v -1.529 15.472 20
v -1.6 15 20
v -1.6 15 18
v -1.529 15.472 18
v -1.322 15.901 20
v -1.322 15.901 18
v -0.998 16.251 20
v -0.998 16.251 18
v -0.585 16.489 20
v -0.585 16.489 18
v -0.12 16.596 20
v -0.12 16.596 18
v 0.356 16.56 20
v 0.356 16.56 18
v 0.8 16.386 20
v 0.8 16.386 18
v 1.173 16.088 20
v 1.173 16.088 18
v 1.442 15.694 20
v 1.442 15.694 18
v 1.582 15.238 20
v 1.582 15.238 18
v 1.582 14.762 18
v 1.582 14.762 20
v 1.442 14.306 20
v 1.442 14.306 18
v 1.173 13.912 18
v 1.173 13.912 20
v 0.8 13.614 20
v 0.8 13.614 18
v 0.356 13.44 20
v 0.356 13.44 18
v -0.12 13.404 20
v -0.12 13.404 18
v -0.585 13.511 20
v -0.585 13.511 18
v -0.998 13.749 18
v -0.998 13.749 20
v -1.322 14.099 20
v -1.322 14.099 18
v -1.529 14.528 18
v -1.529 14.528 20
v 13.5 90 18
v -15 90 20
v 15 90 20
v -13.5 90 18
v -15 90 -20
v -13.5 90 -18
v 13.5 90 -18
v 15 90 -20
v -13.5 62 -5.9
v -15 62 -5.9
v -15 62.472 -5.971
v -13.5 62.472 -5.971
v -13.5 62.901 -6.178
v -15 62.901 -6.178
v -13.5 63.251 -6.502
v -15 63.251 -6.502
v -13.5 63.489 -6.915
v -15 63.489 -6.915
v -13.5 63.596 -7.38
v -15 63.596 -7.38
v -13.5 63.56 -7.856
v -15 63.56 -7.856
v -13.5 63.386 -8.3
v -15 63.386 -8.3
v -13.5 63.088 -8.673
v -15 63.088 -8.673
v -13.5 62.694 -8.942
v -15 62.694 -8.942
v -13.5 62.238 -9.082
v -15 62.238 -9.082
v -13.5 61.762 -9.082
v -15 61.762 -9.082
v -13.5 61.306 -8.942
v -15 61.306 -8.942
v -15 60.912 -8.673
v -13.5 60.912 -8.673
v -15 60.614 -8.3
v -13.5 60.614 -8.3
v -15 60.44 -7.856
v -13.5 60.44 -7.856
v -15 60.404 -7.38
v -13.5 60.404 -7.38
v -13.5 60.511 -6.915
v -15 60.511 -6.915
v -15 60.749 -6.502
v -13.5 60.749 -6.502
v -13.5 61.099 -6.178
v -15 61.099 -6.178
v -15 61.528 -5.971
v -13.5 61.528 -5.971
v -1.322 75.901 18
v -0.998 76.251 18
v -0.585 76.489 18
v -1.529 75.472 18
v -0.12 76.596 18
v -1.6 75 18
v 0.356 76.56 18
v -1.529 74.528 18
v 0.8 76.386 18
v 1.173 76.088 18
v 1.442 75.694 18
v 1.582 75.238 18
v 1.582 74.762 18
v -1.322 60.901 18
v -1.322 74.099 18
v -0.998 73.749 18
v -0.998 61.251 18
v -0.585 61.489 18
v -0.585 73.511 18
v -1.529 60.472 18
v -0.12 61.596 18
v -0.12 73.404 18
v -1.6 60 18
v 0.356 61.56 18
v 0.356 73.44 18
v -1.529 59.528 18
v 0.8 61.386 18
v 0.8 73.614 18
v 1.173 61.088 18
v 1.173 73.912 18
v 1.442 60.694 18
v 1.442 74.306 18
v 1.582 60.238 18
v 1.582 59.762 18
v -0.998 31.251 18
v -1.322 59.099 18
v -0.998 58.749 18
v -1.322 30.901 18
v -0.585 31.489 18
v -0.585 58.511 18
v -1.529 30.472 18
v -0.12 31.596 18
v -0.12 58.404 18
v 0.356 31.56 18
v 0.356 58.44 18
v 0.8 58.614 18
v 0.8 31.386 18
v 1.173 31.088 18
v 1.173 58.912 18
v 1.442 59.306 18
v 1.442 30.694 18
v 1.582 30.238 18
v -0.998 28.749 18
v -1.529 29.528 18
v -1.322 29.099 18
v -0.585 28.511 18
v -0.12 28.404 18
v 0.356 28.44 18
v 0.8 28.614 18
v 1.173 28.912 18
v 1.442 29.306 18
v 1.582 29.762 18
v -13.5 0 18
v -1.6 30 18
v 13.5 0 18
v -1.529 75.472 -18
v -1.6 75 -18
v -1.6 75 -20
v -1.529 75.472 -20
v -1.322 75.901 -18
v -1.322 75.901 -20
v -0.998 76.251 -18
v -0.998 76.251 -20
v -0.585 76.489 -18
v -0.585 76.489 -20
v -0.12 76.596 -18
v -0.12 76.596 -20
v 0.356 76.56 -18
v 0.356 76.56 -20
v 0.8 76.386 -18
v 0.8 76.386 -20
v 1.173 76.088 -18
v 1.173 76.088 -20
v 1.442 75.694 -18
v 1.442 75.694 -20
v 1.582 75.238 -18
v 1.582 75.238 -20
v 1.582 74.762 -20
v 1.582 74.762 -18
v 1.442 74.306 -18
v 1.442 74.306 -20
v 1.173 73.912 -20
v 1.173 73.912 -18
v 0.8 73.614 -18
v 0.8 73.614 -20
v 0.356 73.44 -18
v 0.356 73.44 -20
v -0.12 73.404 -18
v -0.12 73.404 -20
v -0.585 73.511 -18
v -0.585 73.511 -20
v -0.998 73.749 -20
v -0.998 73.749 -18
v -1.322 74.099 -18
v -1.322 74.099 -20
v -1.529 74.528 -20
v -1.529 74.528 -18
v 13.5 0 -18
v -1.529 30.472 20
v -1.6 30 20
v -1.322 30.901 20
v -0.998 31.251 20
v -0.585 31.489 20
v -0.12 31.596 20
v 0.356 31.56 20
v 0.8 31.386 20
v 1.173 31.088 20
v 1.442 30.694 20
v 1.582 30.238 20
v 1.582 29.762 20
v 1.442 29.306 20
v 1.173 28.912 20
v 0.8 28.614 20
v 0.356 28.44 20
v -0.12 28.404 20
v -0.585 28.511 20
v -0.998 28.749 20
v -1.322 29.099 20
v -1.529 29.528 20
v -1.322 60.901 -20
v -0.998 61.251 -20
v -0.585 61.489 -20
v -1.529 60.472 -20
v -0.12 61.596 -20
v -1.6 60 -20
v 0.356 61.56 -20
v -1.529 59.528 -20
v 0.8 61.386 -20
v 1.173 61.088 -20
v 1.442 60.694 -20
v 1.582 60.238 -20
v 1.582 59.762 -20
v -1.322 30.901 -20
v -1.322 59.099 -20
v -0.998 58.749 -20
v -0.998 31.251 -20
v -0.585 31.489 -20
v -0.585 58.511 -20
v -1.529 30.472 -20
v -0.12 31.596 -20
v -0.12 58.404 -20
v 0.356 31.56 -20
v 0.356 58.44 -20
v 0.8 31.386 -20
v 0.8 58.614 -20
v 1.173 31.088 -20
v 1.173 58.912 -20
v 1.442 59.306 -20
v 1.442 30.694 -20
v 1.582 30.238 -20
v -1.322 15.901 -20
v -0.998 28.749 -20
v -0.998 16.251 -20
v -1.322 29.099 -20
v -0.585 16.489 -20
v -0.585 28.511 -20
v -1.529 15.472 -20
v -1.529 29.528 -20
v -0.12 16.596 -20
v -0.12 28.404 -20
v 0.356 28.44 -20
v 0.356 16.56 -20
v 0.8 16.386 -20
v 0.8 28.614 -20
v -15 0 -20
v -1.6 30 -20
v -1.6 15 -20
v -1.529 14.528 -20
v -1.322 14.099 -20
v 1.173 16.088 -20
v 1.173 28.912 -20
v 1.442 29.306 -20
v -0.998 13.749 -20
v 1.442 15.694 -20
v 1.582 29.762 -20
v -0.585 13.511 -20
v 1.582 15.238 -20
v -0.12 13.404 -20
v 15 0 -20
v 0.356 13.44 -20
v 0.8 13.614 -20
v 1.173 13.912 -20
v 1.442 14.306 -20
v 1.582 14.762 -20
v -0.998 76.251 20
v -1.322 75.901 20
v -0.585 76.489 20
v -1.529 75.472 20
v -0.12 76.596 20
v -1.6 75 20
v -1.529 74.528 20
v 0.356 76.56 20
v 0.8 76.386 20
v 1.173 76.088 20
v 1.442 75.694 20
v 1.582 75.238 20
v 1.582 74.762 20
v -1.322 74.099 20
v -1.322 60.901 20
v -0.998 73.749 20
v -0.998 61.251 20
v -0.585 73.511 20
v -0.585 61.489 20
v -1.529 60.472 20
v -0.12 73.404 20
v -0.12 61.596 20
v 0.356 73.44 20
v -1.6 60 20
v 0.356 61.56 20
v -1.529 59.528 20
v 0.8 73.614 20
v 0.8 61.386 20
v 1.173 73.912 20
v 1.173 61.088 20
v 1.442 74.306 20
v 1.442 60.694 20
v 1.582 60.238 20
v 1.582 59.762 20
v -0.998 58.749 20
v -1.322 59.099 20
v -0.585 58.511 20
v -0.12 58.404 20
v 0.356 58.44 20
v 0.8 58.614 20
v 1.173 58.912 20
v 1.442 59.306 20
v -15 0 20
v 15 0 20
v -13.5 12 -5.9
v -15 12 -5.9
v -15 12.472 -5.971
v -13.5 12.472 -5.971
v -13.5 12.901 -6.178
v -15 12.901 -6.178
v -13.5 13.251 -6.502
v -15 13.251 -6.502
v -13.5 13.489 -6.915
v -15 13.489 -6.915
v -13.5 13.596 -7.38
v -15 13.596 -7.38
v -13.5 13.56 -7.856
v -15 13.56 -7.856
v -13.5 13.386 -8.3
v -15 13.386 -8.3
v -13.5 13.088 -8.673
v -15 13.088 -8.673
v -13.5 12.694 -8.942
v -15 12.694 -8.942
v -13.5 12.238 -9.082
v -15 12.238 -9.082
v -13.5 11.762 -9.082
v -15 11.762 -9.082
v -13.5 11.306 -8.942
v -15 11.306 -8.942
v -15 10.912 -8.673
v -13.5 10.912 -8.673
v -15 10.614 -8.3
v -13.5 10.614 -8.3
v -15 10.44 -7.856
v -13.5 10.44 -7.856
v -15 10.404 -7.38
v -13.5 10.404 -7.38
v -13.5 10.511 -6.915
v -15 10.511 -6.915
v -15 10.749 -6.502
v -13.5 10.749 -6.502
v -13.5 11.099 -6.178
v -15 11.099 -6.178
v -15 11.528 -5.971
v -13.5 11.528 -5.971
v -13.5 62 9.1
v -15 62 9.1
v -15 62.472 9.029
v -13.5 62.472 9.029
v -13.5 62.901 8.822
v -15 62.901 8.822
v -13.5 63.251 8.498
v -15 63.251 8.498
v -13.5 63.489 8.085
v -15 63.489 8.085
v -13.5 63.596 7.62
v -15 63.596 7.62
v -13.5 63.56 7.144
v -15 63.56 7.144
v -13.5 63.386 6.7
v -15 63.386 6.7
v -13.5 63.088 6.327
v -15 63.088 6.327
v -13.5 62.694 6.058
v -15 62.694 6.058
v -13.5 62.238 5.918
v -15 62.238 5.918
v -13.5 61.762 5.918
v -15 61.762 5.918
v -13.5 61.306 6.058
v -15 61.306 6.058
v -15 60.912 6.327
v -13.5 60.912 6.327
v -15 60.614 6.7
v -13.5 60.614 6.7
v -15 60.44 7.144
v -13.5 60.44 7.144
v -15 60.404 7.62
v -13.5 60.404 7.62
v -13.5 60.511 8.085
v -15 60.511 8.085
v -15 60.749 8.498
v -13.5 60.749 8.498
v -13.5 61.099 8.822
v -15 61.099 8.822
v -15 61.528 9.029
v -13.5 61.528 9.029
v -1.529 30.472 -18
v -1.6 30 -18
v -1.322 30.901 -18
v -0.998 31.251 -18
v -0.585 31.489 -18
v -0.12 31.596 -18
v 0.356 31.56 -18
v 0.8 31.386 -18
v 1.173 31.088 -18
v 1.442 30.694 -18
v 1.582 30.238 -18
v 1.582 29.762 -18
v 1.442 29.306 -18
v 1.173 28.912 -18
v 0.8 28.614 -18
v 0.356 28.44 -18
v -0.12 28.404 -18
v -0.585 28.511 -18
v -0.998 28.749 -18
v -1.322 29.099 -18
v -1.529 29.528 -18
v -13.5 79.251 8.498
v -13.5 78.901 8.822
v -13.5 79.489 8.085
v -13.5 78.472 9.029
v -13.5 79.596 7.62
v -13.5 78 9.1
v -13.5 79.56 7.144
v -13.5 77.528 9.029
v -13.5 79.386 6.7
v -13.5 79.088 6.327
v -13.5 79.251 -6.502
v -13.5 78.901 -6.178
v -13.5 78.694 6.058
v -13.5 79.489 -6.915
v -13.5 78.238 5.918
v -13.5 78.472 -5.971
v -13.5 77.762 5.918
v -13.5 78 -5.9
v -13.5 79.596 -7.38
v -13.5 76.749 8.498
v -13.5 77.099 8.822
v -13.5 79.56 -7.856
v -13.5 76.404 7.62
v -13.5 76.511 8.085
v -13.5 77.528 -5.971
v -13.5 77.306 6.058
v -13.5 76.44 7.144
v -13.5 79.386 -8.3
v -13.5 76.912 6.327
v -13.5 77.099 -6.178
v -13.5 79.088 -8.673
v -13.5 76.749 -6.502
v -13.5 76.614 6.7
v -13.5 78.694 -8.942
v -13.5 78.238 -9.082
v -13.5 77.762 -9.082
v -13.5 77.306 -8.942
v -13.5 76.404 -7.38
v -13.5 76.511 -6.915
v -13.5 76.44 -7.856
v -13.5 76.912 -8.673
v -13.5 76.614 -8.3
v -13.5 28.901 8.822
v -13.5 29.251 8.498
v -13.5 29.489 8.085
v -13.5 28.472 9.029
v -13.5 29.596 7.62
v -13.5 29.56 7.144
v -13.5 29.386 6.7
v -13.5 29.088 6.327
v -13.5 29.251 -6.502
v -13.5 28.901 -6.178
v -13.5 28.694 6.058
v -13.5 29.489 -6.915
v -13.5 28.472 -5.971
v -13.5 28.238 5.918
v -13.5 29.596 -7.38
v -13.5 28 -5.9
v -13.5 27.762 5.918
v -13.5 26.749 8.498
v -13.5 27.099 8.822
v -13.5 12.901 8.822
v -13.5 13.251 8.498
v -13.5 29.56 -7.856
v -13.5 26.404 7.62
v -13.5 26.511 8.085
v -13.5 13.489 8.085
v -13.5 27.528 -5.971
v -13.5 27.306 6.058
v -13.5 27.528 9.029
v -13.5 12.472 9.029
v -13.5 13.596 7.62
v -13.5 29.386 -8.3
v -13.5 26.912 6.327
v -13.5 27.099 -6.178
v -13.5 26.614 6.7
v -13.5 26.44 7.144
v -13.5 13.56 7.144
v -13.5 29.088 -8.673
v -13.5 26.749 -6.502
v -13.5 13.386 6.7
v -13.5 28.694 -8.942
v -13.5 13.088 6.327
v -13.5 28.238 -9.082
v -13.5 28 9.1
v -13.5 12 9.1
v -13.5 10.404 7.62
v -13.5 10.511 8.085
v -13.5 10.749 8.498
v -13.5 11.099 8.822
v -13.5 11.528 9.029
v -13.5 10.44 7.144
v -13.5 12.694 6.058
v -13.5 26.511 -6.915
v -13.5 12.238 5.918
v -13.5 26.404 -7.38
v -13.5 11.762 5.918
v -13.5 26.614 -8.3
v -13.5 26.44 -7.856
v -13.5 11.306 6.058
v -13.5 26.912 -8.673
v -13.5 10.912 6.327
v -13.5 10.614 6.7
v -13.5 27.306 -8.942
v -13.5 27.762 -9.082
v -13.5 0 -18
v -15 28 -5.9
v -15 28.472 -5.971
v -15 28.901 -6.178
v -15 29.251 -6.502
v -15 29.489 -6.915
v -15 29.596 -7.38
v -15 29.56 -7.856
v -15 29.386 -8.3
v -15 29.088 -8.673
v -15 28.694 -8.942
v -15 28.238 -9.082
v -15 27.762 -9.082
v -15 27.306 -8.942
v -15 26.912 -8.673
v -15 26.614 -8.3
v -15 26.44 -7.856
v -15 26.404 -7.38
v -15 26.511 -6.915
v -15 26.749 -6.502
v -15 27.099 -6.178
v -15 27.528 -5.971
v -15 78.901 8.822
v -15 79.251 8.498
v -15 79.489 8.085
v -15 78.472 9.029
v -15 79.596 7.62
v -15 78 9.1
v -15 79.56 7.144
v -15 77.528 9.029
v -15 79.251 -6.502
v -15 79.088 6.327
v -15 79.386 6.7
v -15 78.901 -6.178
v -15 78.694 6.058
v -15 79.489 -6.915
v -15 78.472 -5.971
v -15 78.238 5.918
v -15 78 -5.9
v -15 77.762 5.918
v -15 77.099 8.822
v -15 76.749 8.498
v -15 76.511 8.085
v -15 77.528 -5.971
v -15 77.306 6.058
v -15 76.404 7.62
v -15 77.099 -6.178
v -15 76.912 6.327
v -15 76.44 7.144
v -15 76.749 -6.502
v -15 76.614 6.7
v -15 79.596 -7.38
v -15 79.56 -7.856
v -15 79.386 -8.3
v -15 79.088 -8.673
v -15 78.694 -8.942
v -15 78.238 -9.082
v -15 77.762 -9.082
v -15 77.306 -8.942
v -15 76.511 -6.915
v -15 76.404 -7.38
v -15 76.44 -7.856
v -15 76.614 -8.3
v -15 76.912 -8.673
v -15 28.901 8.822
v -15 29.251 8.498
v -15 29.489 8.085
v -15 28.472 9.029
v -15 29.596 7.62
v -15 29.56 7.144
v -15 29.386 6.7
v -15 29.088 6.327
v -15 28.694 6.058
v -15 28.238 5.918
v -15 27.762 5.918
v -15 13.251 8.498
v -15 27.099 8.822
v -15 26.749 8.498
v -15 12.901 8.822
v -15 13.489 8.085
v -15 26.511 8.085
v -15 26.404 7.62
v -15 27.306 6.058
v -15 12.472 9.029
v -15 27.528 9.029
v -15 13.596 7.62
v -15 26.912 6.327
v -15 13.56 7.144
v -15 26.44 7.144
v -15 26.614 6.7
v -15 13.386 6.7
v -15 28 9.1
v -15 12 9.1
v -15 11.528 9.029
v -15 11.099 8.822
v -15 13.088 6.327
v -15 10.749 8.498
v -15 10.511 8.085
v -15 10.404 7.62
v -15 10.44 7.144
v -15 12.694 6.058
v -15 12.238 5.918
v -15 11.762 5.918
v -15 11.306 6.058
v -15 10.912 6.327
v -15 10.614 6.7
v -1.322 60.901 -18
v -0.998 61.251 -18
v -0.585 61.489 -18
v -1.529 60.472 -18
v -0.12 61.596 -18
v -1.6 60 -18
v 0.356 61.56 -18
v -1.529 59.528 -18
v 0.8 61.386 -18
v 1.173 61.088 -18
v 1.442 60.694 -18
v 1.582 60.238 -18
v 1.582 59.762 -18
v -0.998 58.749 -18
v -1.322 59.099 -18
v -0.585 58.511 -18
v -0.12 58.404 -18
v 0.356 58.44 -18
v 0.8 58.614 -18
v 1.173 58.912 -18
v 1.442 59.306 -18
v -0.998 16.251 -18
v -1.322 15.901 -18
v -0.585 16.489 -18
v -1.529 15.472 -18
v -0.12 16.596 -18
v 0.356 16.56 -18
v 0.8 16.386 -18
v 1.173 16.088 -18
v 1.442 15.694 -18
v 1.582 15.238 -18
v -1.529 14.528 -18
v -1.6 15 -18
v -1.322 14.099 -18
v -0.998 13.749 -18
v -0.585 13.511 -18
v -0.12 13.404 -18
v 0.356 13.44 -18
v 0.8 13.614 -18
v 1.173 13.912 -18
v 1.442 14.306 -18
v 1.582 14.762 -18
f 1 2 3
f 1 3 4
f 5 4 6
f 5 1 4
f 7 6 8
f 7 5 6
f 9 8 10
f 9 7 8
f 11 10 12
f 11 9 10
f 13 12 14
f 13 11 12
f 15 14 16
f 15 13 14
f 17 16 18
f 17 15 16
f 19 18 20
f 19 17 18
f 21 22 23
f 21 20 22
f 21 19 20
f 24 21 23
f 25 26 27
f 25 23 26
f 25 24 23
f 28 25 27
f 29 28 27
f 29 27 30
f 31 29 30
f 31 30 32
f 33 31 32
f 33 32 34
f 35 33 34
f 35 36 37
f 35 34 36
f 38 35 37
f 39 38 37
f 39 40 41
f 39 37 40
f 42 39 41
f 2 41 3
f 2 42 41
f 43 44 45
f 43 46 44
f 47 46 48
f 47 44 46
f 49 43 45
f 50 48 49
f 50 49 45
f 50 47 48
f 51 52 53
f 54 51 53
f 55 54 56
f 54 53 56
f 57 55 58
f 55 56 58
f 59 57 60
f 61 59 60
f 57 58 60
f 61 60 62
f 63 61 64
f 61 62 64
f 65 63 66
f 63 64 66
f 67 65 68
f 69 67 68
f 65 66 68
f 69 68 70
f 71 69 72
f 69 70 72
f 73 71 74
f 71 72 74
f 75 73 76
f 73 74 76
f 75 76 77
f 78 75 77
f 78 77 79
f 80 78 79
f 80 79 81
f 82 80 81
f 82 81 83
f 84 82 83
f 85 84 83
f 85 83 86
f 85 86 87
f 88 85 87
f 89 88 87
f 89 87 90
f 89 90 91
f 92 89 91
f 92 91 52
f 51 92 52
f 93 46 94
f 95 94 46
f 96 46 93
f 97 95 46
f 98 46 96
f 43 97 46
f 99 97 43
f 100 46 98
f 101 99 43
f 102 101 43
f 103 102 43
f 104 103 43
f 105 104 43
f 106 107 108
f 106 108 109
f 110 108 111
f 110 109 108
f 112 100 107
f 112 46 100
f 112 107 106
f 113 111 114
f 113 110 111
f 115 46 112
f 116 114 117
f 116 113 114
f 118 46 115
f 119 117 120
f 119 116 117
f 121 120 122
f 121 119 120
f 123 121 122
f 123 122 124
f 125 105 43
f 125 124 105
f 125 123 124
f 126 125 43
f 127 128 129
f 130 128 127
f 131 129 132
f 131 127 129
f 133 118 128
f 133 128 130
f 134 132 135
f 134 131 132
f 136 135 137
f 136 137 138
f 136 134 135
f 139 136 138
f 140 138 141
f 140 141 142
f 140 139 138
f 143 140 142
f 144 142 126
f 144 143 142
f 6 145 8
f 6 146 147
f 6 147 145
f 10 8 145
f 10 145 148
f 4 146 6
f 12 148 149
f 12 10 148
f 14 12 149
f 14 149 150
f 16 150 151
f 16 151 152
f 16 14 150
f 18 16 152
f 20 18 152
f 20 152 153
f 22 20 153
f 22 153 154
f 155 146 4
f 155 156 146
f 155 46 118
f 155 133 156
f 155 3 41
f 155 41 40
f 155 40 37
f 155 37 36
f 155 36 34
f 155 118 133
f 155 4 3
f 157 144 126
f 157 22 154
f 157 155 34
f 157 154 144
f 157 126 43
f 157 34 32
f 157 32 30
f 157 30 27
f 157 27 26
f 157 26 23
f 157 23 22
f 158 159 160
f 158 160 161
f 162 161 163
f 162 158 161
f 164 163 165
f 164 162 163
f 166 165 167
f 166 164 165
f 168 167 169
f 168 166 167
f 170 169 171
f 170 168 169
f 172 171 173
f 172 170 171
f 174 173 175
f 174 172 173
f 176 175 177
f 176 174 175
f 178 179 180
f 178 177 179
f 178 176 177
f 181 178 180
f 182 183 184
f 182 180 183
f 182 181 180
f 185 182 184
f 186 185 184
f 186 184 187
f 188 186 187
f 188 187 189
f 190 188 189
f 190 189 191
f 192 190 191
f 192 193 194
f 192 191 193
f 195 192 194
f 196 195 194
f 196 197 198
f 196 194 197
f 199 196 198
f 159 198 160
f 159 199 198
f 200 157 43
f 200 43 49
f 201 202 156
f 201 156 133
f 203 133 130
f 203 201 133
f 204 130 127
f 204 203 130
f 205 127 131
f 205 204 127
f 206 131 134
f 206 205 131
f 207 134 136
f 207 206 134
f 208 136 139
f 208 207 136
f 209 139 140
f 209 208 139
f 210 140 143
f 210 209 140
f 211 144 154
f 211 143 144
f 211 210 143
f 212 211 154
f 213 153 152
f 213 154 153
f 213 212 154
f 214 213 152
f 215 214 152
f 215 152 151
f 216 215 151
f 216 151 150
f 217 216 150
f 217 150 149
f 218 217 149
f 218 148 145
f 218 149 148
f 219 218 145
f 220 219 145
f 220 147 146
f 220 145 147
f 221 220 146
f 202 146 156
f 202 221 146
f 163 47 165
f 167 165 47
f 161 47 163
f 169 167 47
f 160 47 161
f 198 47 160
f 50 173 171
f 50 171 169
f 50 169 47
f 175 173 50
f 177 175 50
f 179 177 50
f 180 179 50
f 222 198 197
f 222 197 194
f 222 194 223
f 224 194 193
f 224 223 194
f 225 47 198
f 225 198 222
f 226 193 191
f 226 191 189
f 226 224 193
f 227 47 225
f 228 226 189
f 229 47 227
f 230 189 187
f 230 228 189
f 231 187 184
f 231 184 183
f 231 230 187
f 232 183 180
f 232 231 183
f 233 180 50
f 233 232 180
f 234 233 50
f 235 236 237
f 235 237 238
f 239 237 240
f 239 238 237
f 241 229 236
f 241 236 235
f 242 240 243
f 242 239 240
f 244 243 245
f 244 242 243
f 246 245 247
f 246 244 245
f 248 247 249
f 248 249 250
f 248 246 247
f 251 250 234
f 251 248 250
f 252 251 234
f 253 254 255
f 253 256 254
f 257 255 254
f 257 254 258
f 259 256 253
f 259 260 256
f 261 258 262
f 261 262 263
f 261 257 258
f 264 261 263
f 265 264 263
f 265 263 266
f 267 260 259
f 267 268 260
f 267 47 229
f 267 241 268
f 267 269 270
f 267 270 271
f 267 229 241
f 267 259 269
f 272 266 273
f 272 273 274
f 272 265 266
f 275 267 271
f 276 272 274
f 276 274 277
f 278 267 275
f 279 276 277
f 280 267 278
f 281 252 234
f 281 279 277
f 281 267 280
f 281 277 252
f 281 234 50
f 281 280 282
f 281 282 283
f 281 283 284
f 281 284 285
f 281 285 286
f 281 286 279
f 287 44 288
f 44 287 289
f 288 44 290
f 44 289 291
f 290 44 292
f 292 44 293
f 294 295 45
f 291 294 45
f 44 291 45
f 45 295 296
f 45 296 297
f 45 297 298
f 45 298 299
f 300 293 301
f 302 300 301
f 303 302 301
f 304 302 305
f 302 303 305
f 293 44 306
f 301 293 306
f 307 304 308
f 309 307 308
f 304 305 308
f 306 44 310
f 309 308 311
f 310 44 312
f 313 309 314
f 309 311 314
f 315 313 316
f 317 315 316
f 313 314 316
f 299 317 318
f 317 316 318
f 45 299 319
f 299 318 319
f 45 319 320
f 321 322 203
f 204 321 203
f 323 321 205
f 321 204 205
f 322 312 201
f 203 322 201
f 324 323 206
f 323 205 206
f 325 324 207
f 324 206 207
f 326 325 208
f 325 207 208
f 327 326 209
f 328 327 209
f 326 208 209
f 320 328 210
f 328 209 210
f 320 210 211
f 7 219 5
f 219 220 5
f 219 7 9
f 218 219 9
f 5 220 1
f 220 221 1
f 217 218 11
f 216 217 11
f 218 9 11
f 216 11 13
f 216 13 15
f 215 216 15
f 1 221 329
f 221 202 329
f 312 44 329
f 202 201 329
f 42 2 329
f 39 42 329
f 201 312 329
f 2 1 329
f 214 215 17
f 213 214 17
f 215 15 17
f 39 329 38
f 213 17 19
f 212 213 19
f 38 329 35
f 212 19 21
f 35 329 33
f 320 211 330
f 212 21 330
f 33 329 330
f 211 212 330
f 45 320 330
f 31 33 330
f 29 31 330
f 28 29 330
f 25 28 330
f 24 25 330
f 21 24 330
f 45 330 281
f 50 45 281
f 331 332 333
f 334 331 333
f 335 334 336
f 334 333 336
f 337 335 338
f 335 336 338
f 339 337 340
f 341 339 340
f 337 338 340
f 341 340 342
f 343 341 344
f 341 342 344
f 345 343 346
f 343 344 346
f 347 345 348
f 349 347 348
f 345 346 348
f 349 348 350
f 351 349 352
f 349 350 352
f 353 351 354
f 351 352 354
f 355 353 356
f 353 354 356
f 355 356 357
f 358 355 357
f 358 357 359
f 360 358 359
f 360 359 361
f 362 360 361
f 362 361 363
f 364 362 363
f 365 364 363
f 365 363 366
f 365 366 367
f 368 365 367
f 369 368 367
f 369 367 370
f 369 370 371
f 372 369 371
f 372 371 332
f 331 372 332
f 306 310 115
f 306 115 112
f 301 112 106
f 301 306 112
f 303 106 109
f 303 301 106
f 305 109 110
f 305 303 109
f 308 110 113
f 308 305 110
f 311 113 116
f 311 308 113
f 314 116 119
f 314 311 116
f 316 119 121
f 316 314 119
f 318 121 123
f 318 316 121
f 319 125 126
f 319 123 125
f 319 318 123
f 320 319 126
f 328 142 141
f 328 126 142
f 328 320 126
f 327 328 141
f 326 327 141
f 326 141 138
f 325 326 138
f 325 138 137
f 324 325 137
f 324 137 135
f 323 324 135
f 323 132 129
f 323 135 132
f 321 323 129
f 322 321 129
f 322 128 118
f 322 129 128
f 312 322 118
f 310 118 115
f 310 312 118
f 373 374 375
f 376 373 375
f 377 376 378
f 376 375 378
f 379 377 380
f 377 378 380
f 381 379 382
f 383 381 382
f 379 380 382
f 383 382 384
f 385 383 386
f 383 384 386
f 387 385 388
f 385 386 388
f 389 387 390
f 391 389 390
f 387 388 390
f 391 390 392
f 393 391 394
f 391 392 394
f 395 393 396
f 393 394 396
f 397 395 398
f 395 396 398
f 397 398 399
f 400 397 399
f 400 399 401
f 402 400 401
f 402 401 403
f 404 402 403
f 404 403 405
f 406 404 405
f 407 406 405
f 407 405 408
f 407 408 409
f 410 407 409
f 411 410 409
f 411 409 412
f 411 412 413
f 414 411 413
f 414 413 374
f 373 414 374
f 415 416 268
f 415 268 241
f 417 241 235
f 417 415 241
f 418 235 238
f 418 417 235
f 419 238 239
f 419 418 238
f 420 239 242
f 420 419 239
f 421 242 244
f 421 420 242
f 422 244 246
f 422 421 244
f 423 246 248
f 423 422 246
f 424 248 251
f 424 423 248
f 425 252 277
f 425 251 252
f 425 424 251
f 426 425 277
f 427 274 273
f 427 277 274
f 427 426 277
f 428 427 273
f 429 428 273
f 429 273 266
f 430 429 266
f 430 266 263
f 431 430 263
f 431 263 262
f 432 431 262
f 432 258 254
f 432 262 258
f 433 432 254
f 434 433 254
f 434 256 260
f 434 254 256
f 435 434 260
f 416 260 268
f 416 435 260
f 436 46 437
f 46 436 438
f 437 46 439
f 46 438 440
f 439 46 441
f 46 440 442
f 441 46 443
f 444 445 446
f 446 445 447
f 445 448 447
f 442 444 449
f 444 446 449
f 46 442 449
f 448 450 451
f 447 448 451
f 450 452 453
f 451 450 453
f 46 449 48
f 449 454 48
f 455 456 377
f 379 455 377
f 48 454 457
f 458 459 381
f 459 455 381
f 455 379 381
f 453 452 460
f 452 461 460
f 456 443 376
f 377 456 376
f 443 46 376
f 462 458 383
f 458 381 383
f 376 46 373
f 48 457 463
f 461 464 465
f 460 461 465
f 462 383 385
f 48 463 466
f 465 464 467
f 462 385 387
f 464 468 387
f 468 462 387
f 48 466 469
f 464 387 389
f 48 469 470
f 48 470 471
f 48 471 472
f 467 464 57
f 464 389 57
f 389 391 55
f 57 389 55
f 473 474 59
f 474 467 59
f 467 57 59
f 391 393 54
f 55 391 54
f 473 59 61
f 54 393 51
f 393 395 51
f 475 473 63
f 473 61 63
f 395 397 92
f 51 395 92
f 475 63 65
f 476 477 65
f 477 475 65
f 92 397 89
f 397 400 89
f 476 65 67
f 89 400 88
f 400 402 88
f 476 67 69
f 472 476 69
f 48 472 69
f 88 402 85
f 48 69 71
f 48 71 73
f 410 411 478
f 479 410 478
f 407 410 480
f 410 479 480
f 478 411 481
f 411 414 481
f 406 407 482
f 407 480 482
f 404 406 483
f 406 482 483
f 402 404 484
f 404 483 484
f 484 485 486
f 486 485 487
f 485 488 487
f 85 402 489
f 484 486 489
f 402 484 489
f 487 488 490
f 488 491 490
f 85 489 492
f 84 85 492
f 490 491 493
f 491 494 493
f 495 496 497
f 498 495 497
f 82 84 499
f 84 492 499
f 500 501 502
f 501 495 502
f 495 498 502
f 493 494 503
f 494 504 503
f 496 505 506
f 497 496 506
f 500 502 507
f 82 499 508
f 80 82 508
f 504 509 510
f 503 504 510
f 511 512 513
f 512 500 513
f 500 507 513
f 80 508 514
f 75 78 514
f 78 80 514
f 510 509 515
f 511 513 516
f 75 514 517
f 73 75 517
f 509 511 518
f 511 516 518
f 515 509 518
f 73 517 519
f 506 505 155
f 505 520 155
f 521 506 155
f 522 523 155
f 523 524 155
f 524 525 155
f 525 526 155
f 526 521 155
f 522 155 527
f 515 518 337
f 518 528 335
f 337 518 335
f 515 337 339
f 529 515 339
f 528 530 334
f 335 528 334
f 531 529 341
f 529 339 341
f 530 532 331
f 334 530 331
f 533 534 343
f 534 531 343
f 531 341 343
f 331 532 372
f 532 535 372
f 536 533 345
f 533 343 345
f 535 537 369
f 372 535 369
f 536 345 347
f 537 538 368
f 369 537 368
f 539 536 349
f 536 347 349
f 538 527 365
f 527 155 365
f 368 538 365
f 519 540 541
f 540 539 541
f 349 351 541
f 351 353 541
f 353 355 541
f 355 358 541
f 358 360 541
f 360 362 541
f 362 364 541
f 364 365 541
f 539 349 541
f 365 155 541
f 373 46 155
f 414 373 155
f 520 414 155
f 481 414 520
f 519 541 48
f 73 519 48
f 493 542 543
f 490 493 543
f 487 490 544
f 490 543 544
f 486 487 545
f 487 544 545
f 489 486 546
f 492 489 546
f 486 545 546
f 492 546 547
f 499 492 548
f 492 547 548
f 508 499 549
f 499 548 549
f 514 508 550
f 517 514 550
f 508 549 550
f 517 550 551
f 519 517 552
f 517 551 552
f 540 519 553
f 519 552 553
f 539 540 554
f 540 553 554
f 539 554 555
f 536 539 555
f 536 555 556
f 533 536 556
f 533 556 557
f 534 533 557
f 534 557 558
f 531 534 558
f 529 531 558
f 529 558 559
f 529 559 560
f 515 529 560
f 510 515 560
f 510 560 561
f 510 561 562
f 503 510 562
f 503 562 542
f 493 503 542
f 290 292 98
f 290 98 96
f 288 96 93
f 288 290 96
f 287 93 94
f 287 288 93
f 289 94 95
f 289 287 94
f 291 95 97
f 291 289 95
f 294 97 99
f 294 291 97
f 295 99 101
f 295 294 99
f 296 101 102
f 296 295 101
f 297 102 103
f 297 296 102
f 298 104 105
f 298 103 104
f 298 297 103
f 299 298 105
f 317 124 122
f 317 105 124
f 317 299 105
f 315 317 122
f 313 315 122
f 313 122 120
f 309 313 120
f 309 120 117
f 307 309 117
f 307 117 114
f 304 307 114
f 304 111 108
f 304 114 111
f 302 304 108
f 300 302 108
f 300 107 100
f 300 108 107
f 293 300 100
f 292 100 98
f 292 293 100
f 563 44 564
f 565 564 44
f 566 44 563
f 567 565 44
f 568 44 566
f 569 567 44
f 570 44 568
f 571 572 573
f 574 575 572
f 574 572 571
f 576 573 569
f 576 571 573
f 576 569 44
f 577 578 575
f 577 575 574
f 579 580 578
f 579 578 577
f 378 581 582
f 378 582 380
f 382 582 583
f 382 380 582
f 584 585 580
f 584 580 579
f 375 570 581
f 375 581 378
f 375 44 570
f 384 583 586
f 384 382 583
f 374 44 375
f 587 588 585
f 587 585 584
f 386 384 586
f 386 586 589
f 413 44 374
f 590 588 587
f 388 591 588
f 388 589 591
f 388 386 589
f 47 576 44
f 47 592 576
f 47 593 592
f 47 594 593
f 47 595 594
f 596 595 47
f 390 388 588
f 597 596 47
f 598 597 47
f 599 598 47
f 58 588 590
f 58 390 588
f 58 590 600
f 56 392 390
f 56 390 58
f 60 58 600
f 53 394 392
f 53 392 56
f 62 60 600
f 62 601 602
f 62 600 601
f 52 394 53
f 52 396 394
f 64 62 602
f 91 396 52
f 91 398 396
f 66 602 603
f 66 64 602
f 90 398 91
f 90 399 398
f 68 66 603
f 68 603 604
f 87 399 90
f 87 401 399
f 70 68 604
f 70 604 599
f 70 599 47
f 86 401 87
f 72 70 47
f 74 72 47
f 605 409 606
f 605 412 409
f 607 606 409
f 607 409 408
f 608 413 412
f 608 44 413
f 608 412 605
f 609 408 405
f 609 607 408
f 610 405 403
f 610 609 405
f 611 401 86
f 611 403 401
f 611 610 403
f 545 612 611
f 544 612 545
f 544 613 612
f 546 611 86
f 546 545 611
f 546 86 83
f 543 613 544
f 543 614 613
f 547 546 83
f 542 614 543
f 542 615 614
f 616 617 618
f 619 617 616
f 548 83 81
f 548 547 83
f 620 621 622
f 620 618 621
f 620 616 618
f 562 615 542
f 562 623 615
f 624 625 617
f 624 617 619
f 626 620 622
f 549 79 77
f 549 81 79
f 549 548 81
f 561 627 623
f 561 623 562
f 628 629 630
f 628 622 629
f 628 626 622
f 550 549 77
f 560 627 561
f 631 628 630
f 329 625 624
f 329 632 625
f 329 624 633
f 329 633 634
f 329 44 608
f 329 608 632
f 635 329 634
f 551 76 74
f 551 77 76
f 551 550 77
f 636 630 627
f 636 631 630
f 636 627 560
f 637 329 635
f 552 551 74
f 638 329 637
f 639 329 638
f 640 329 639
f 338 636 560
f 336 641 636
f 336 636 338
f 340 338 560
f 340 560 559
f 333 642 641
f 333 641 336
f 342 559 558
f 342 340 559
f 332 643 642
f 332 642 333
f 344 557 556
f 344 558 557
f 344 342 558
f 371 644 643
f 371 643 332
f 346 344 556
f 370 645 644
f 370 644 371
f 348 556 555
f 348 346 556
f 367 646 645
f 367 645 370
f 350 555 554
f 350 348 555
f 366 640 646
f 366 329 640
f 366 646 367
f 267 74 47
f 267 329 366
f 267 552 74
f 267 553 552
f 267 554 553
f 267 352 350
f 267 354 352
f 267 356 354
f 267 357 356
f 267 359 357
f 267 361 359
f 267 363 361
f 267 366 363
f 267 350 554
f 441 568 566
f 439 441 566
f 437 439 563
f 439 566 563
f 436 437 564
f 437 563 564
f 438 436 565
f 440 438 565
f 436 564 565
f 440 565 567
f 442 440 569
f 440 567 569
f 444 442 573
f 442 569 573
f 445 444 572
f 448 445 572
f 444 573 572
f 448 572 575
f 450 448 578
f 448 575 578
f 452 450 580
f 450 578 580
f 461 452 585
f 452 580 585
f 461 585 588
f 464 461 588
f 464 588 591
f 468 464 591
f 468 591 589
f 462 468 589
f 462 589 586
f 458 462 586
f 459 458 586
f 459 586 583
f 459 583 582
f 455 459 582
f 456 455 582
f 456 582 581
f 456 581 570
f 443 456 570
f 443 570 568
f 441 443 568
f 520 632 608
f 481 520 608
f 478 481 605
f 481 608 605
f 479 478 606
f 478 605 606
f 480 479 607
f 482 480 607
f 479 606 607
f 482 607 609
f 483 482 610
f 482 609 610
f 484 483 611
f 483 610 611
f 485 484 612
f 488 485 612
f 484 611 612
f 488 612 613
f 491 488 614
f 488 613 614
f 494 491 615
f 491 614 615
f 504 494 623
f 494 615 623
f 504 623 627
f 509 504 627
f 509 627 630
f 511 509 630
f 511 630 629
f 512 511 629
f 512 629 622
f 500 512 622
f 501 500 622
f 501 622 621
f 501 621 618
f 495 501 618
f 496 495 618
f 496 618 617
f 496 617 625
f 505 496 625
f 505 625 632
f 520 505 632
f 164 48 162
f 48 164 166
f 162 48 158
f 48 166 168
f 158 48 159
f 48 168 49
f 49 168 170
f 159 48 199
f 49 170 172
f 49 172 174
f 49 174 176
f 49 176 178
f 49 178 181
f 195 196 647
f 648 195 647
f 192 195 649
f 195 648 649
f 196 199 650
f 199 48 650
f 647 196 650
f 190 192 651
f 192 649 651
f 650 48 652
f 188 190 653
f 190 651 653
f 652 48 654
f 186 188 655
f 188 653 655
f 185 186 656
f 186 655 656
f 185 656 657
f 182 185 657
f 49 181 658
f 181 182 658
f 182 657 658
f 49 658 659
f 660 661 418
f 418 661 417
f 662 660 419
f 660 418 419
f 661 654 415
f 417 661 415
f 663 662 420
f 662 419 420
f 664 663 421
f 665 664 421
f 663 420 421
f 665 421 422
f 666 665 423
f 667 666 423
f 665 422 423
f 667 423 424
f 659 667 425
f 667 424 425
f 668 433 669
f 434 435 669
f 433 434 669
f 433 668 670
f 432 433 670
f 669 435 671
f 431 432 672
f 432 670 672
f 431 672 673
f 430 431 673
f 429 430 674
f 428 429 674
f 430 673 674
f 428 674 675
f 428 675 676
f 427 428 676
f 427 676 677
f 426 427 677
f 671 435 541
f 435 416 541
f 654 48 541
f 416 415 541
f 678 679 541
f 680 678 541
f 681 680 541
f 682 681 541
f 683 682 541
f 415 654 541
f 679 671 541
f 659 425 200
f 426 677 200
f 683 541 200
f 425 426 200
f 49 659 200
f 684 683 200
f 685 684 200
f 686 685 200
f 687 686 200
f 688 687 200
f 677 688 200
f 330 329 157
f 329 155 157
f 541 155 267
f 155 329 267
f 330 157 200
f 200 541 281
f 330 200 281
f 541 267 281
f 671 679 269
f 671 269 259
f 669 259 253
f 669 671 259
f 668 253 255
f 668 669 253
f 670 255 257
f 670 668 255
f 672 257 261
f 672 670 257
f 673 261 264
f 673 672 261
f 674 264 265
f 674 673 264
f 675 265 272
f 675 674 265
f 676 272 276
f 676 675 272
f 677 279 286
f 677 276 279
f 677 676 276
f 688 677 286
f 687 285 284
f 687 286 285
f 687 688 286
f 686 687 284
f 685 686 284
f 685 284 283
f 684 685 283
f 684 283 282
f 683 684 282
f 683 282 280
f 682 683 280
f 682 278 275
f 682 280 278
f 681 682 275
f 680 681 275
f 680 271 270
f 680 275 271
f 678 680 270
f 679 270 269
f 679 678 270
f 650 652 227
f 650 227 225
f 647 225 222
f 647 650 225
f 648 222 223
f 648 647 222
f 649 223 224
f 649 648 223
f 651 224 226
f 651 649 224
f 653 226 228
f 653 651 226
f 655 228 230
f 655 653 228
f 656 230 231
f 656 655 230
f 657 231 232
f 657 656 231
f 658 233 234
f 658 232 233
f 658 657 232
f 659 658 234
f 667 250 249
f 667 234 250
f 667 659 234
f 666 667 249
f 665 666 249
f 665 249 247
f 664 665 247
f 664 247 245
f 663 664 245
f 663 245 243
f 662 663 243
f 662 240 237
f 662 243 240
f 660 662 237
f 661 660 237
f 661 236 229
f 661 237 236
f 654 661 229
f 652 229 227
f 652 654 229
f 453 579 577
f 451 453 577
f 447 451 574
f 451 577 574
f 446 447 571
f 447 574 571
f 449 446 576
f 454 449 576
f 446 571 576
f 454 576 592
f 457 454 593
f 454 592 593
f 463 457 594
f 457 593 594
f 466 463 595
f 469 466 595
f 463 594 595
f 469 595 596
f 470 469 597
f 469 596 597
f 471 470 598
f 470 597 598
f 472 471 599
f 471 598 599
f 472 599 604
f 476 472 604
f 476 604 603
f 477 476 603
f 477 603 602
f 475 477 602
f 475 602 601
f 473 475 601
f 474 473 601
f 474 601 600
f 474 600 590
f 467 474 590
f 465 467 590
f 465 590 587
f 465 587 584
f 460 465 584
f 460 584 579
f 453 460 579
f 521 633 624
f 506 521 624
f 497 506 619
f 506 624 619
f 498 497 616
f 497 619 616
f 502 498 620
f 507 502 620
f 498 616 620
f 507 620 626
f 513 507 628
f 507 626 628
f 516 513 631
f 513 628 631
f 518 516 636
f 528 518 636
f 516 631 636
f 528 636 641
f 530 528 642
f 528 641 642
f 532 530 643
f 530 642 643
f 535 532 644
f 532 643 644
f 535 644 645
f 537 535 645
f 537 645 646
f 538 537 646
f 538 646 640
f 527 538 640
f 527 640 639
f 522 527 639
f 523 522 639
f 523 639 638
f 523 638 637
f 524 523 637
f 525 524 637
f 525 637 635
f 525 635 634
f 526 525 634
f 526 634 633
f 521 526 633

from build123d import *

# Parameters (mm, degrees)
SKETCH_1_W               = 30
SKETCH_1_H               = 40
SKETCH_1_W_2             = 27
SKETCH_1_H_2             = 36
EXTRUDE_1_DEPTH          = 90
CUT_EXTRUDE_1_REACH      = 98.954
SKETCH_2_R               = 1.6
CUT_EXTRUDE_2_DEPTH      = 99.838251704
CUT_EXTRUDE_2_DEPTH_BACK = 99.838251704
SKETCH_3_R               = 1.6


with BuildPart() as part:
    # 草图1 → 凸台-拉伸1 (new body)
    with BuildSketch(Plane(origin=(0, 0, 0), x_dir=(1, 0, 0), z_dir=(0, 1, 0))):
        Rectangle(SKETCH_1_W, SKETCH_1_H)
        Rectangle(SKETCH_1_W_2, SKETCH_1_H_2, mode=Mode.SUBTRACT)
    extrude(amount=EXTRUDE_1_DEPTH)

    # 草图2 → 切除-拉伸1 (cut, up to next)
    with BuildSketch(Plane.ZY.offset(15), mode=Mode.PRIVATE) as cut_extrude_1_sk1:
        with Locations((7.5, 78)):
            Circle(SKETCH_2_R)
    cut_extrude_1_tool1 = extrude(cut_extrude_1_sk1.sketch, amount=-CUT_EXTRUDE_1_REACH, mode=Mode.PRIVATE) & part.part
    # 草图2 → 切除-拉伸1 (cut, up to next)
    with BuildSketch(Plane.ZY.offset(15), mode=Mode.PRIVATE) as cut_extrude_1_sk2:
        with Locations((-7.5, 78)):
            Circle(SKETCH_2_R)
    cut_extrude_1_tool2 = extrude(cut_extrude_1_sk2.sketch, amount=-CUT_EXTRUDE_1_REACH, mode=Mode.PRIVATE) & part.part
    # 草图2 → 切除-拉伸1 (cut, up to next)
    with BuildSketch(Plane.ZY.offset(15), mode=Mode.PRIVATE) as cut_extrude_1_sk3:
        with Locations((-7.5, 62)):
            Circle(SKETCH_2_R)
    cut_extrude_1_tool3 = extrude(cut_extrude_1_sk3.sketch, amount=-CUT_EXTRUDE_1_REACH, mode=Mode.PRIVATE) & part.part
    # 草图2 → 切除-拉伸1 (cut, up to next)
    with BuildSketch(Plane.ZY.offset(15), mode=Mode.PRIVATE) as cut_extrude_1_sk4:
        with Locations((7.5, 62)):
            Circle(SKETCH_2_R)
    cut_extrude_1_tool4 = extrude(cut_extrude_1_sk4.sketch, amount=-CUT_EXTRUDE_1_REACH, mode=Mode.PRIVATE) & part.part
    # 草图2 → 切除-拉伸1 (cut, up to next)
    with BuildSketch(Plane.ZY.offset(15), mode=Mode.PRIVATE) as cut_extrude_1_sk5:
        with Locations((7.5, 28)):
            Circle(SKETCH_2_R)
    cut_extrude_1_tool5 = extrude(cut_extrude_1_sk5.sketch, amount=-CUT_EXTRUDE_1_REACH, mode=Mode.PRIVATE) & part.part
    # 草图2 → 切除-拉伸1 (cut, up to next)
    with BuildSketch(Plane.ZY.offset(15), mode=Mode.PRIVATE) as cut_extrude_1_sk6:
        with Locations((7.5, 12)):
            Circle(SKETCH_2_R)
    cut_extrude_1_tool6 = extrude(cut_extrude_1_sk6.sketch, amount=-CUT_EXTRUDE_1_REACH, mode=Mode.PRIVATE) & part.part
    # 草图2 → 切除-拉伸1 (cut, up to next)
    with BuildSketch(Plane.ZY.offset(15), mode=Mode.PRIVATE) as cut_extrude_1_sk7:
        with Locations((-7.5, 28)):
            Circle(SKETCH_2_R)
    cut_extrude_1_tool7 = extrude(cut_extrude_1_sk7.sketch, amount=-CUT_EXTRUDE_1_REACH, mode=Mode.PRIVATE) & part.part
    # 草图2 → 切除-拉伸1 (cut, up to next)
    with BuildSketch(Plane.ZY.offset(15), mode=Mode.PRIVATE) as cut_extrude_1_sk8:
        with Locations((-7.5, 12)):
            Circle(SKETCH_2_R)
    cut_extrude_1_tool8 = extrude(cut_extrude_1_sk8.sketch, amount=-CUT_EXTRUDE_1_REACH, mode=Mode.PRIVATE) & part.part
    add(cut_extrude_1_tool1.solids().sort_by_distance((-15, 78, 7.5))[0], mode=Mode.SUBTRACT)
    add(cut_extrude_1_tool2.solids().sort_by_distance((-15, 78, -7.5))[0], mode=Mode.SUBTRACT)
    add(cut_extrude_1_tool3.solids().sort_by_distance((-15, 62, -7.5))[0], mode=Mode.SUBTRACT)
    add(cut_extrude_1_tool4.solids().sort_by_distance((-15, 62, 7.5))[0], mode=Mode.SUBTRACT)
    add(cut_extrude_1_tool5.solids().sort_by_distance((-15, 28, 7.5))[0], mode=Mode.SUBTRACT)
    add(cut_extrude_1_tool6.solids().sort_by_distance((-15, 12, 7.5))[0], mode=Mode.SUBTRACT)
    add(cut_extrude_1_tool7.solids().sort_by_distance((-15, 28, -7.5))[0], mode=Mode.SUBTRACT)
    add(cut_extrude_1_tool8.solids().sort_by_distance((-15, 12, -7.5))[0], mode=Mode.SUBTRACT)

    # 草图3 → 切除-拉伸2 (cut, two sides: drawn at the far end of the back side and taken through both)
    with BuildSketch(Plane(origin=(0, 0, 18), x_dir=(-1, 0, 0), z_dir=(0, 0, -1)).offset(-CUT_EXTRUDE_2_DEPTH_BACK)):
        with Locations((0, 30)):
            Circle(SKETCH_3_R)
        with Locations((0, 15)):
            Circle(SKETCH_3_R)
        with Locations((0, 75)):
            Circle(SKETCH_3_R)
        with Locations((0, 60)):
            Circle(SKETCH_3_R)
    extrude(amount=CUT_EXTRUDE_2_DEPTH + CUT_EXTRUDE_2_DEPTH_BACK, mode=Mode.SUBTRACT)


solid = part.part
